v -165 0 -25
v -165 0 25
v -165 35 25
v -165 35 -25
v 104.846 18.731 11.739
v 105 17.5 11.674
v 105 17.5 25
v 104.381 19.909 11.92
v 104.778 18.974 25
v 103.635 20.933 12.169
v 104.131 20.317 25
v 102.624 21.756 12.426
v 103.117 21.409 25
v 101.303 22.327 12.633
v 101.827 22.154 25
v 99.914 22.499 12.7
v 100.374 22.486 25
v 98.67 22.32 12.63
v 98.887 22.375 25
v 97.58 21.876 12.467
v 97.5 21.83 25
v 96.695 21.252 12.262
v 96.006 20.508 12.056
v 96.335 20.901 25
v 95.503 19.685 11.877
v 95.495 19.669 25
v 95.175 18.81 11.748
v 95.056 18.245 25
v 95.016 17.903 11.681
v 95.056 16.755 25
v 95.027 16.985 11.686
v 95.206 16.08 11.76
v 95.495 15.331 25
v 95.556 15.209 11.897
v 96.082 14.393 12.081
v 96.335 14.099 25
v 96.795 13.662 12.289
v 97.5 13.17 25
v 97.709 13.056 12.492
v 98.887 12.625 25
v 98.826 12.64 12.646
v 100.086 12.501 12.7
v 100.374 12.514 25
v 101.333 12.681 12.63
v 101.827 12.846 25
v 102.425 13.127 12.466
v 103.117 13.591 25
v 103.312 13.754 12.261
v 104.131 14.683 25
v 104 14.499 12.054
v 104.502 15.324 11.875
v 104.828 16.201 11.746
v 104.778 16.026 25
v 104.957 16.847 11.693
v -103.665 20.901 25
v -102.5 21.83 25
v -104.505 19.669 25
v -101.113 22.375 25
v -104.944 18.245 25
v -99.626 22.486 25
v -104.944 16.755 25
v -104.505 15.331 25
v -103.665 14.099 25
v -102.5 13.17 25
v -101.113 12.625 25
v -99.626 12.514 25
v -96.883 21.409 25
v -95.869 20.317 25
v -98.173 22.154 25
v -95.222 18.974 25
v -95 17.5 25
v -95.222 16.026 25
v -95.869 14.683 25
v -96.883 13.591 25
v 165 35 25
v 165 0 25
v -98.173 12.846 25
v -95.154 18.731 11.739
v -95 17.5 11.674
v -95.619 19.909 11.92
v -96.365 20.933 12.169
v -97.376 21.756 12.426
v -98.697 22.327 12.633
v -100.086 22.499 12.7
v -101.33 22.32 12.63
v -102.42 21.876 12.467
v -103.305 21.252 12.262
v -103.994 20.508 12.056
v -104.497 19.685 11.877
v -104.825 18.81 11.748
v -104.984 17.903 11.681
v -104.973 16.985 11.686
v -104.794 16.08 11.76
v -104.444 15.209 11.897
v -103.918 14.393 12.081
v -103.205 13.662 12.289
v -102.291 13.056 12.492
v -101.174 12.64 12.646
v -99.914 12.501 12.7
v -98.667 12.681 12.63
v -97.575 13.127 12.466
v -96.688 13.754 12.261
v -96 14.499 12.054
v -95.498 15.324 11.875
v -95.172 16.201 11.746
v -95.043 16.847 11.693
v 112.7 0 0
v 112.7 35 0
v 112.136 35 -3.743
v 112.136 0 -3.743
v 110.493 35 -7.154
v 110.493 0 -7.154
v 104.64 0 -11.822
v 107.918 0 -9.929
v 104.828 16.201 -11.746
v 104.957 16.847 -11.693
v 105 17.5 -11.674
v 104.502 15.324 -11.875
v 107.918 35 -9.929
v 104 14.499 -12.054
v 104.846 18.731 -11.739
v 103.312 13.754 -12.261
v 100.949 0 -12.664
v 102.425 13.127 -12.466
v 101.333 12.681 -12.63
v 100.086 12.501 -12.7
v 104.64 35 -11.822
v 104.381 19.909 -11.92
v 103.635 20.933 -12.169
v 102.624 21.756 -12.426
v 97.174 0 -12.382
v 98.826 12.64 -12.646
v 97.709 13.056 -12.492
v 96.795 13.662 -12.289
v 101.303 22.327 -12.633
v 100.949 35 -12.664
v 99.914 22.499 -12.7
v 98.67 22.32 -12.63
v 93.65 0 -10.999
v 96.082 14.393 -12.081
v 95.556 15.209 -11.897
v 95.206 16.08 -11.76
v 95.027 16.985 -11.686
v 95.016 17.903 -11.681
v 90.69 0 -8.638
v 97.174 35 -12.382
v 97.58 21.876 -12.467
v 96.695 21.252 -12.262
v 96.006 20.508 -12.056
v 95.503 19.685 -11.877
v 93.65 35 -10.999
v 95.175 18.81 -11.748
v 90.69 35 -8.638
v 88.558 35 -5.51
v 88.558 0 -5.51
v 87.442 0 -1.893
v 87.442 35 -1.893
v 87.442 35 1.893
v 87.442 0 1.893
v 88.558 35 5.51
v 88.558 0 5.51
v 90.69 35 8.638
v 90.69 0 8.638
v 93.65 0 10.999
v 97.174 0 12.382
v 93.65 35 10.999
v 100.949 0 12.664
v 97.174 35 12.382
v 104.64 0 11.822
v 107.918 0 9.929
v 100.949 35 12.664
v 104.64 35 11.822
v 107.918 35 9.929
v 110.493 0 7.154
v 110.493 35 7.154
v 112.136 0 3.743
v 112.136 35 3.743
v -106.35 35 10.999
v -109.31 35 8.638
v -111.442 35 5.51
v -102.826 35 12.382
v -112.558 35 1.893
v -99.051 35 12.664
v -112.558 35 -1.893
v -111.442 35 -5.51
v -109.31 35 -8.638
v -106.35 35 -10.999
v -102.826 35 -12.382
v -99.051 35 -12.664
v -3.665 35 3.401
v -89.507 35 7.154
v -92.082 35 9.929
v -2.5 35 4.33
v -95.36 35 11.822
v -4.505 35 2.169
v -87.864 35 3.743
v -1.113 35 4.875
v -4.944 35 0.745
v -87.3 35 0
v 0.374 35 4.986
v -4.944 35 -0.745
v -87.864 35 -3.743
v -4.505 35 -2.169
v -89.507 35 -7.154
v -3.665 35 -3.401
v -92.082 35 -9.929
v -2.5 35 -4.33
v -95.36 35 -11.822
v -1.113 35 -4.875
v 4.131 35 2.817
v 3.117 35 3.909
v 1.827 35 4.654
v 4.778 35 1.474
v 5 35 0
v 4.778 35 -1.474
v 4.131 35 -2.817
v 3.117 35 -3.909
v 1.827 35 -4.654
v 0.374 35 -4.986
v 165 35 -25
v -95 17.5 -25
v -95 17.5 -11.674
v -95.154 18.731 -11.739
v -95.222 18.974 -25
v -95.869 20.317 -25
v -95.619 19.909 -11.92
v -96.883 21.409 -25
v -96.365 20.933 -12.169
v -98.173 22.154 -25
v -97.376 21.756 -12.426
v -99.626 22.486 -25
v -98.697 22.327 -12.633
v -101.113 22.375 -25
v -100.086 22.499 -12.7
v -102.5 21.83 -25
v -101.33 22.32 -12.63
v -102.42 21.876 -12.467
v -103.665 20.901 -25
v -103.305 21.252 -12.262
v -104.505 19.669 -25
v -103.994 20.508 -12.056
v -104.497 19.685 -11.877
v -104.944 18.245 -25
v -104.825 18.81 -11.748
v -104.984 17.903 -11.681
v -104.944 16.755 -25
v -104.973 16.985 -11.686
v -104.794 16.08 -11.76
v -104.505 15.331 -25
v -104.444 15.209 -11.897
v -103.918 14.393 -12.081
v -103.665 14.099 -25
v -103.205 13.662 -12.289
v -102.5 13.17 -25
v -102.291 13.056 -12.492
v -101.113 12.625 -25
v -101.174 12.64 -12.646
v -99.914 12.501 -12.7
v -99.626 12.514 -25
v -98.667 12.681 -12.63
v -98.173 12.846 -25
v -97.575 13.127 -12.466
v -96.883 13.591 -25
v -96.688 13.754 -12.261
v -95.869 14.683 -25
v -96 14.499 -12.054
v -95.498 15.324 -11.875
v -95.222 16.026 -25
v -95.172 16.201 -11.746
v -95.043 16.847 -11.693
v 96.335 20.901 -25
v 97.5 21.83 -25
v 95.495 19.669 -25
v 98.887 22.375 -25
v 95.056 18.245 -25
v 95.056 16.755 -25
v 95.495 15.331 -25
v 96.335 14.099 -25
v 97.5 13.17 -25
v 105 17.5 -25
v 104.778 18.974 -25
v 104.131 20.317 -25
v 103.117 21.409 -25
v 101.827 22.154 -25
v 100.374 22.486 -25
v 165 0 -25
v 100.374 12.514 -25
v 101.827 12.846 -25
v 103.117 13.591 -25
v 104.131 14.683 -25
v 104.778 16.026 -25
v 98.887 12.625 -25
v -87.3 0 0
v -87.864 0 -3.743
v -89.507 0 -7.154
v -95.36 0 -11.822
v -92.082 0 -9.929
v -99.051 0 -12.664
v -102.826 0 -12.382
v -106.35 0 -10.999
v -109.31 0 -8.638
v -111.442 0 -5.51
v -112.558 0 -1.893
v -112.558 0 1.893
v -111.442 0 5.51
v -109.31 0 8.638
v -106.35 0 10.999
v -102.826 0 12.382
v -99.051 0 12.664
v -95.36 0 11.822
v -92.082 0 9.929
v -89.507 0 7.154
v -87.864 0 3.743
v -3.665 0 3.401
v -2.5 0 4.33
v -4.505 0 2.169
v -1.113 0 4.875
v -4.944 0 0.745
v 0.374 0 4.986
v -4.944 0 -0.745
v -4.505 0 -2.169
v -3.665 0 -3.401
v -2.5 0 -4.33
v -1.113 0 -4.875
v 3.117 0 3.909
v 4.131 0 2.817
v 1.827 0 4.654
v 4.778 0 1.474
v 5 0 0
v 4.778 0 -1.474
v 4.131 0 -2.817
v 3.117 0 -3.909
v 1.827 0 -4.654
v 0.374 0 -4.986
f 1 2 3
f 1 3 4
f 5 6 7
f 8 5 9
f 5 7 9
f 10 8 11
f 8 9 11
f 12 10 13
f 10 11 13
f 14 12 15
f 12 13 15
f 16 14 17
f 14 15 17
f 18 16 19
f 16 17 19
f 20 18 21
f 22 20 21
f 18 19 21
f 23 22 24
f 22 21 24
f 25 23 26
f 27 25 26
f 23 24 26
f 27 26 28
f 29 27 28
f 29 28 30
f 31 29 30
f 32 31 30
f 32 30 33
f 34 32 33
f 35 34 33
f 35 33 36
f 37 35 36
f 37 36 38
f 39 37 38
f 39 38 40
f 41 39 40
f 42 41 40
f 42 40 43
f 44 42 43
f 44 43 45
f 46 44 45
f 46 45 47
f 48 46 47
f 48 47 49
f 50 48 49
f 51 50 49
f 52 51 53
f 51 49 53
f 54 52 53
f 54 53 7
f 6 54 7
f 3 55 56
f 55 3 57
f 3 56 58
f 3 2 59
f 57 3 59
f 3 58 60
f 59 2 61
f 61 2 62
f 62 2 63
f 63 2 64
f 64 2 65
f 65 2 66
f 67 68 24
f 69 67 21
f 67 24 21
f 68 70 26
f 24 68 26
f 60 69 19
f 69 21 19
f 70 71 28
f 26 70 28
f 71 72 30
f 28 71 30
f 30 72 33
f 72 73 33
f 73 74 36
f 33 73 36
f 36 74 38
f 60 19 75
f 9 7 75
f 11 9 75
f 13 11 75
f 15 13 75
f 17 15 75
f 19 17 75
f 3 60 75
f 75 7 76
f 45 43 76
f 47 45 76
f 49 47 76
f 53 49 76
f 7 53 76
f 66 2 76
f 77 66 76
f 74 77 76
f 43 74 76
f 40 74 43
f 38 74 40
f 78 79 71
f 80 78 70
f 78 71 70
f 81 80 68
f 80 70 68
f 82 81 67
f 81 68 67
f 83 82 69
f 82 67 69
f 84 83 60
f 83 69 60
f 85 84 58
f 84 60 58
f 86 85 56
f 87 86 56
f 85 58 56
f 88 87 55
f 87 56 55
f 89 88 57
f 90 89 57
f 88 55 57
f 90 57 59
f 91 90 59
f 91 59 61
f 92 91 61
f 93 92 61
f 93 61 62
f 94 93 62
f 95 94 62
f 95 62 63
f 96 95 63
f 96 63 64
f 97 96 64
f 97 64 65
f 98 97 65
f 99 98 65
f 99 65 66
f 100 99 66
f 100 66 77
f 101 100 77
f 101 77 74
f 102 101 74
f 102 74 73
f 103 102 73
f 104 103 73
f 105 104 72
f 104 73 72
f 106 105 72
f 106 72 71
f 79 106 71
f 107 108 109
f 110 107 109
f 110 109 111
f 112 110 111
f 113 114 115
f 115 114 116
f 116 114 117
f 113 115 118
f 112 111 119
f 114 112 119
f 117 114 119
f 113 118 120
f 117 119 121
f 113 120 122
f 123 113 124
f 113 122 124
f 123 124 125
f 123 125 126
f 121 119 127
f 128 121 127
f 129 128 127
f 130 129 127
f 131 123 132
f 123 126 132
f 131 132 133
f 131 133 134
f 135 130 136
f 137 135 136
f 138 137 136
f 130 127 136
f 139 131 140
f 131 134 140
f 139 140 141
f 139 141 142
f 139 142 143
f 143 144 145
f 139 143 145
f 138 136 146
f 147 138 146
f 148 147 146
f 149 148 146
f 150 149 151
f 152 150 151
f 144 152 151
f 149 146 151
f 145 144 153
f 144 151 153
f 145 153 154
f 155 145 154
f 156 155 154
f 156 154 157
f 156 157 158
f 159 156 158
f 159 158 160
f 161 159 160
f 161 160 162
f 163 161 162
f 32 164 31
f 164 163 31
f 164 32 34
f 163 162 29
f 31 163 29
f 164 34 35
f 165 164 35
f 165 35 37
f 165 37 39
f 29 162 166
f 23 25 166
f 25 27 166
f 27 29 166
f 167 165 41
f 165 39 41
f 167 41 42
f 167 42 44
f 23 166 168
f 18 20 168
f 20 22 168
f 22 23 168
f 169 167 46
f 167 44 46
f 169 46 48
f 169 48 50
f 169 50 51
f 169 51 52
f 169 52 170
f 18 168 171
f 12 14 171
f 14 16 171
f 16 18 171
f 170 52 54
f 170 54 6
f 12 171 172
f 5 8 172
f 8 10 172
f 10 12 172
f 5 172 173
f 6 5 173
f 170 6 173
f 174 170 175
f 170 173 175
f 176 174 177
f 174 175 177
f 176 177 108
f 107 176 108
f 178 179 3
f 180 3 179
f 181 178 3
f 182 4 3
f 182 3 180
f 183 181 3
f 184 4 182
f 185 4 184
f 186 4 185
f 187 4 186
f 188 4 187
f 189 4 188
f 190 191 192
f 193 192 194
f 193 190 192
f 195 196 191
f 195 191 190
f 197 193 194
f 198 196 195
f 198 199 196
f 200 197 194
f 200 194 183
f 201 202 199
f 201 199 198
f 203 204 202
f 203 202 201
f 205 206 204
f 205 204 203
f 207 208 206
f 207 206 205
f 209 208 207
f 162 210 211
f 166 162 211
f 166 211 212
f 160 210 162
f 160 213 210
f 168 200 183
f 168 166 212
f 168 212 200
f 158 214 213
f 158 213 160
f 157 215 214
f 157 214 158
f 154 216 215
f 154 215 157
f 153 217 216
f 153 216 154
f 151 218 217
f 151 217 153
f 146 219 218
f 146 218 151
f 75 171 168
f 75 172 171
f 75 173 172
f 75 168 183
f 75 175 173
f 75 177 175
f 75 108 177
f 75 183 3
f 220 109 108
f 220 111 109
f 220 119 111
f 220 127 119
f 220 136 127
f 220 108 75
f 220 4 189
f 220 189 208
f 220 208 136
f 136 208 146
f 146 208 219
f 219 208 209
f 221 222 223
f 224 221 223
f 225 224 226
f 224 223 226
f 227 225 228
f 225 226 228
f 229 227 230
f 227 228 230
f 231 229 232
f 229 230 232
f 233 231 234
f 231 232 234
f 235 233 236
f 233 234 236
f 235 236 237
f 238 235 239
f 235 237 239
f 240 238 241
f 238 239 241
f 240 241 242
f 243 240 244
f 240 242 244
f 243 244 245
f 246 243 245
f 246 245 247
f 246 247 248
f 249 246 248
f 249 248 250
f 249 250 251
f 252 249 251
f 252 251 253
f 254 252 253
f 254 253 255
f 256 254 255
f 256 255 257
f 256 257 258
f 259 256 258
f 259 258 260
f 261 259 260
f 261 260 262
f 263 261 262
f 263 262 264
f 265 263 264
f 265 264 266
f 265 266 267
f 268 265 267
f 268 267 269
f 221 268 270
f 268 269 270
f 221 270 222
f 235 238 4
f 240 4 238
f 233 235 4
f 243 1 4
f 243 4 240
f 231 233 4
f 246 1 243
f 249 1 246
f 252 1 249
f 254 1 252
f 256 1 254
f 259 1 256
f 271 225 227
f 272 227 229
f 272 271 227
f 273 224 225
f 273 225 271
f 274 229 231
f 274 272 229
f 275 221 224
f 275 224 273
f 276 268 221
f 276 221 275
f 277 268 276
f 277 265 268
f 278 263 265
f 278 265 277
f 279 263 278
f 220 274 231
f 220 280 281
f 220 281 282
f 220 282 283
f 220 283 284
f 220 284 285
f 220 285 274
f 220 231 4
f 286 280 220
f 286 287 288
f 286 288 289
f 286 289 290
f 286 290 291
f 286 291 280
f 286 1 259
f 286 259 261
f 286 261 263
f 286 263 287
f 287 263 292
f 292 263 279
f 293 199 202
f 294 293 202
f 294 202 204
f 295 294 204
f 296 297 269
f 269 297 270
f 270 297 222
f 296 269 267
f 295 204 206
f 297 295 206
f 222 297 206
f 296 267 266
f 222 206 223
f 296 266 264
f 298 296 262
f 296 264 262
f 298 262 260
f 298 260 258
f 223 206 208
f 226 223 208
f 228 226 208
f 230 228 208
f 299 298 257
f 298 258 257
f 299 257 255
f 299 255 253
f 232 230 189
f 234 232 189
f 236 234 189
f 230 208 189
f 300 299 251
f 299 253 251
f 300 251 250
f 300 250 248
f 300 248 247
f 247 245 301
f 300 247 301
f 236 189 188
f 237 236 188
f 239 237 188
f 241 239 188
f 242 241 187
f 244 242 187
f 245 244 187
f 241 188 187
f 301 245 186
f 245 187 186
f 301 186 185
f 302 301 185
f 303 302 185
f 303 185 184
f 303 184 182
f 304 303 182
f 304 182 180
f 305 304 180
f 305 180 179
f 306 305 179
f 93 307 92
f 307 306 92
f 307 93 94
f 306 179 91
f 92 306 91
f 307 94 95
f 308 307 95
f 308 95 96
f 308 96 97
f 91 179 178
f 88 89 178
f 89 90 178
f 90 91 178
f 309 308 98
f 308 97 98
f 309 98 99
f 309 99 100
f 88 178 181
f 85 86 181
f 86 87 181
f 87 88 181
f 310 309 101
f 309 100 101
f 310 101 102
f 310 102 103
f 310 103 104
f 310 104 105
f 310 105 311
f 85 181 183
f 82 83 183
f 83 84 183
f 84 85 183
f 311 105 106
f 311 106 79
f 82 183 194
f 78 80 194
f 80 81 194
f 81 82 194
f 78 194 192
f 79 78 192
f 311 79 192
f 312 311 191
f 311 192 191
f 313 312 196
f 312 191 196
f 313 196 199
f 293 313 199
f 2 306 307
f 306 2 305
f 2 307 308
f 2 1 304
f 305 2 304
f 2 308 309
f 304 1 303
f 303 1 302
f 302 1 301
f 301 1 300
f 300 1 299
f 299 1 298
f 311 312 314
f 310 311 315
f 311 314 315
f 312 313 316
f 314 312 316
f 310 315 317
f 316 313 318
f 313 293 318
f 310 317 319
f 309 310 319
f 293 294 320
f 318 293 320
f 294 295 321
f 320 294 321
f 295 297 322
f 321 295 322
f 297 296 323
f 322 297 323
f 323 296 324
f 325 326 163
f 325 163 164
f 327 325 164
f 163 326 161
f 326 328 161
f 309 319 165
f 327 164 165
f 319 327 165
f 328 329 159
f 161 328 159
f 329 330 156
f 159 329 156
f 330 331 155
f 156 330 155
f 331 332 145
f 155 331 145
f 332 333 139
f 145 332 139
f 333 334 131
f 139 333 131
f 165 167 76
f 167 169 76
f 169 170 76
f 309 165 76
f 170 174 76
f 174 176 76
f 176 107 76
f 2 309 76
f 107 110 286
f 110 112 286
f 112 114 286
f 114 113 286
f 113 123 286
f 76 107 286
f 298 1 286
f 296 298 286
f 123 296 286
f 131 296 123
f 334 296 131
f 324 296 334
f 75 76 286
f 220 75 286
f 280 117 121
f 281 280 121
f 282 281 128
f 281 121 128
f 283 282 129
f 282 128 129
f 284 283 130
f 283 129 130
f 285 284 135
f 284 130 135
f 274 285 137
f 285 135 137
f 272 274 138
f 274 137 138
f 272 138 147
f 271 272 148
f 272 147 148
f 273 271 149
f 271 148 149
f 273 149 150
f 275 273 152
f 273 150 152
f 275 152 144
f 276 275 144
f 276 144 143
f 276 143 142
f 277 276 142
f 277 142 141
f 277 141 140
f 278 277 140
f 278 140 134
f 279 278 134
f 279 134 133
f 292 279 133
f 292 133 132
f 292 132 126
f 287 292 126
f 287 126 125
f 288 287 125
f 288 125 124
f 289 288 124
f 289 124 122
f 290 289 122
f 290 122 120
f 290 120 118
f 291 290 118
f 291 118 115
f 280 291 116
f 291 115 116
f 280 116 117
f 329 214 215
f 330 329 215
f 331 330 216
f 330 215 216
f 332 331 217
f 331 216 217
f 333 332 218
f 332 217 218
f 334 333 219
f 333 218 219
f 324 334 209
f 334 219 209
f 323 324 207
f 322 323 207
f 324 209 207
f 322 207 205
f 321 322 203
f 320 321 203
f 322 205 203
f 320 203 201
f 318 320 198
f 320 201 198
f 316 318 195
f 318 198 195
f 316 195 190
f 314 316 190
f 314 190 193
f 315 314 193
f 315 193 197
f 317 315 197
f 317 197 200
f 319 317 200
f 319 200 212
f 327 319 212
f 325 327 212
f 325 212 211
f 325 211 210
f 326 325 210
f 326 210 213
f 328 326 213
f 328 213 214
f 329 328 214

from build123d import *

# Parameters (mm, degrees)
SKETCH1_W           = 330
SKETCH1_H           = 50
BOSS_EXTRUDE1_DEPTH = 35
SKETCH2_R           = 12.7
CUT_EXTRUDE1_DEPTH  = 70
SKETCH3_R           = 5
CUT_EXTRUDE2_DEPTH  = 70
SKETCH4_R           = 5
CUT_EXTRUDE3_DEPTH  = 43


with BuildPart() as part:
    # Sketch1 → Boss-Extrude1 (new body)
    with BuildSketch(Plane(origin=(0, 0, 0), x_dir=(1, 0, 0), z_dir=(0, 1, 0))):
        Rectangle(SKETCH1_W, SKETCH1_H)
    extrude(amount=BOSS_EXTRUDE1_DEPTH)

    # Sketch2 → Cut-Extrude1 (cut)
    with BuildSketch(Plane(origin=(0, 35, 0), x_dir=(1, 0, 0), z_dir=(0, 1, 0))):
        with Locations((-100, 0)):
            Circle(SKETCH2_R)
        with Locations((100, 0)):
            Circle(SKETCH2_R)
    extrude(amount=-CUT_EXTRUDE1_DEPTH, mode=Mode.SUBTRACT)

    # Sketch3 → Cut-Extrude2 (cut)
    with BuildSketch(Plane.XY.offset(25)):
        with Locations((-100, 17.5)):
            Circle(SKETCH3_R)
        with Locations((100, 17.5)):
            Circle(SKETCH3_R)
    extrude(amount=-CUT_EXTRUDE2_DEPTH, mode=Mode.SUBTRACT)

    # Sketch4 → Cut-Extrude3 (cut)
    with BuildSketch(Plane(origin=(0, 35, 0), x_dir=(1, 0, 0), z_dir=(0, 1, 0))):
        Circle(SKETCH4_R)
    extrude(amount=-CUT_EXTRUDE3_DEPTH, mode=Mode.SUBTRACT)


solid = part.part
